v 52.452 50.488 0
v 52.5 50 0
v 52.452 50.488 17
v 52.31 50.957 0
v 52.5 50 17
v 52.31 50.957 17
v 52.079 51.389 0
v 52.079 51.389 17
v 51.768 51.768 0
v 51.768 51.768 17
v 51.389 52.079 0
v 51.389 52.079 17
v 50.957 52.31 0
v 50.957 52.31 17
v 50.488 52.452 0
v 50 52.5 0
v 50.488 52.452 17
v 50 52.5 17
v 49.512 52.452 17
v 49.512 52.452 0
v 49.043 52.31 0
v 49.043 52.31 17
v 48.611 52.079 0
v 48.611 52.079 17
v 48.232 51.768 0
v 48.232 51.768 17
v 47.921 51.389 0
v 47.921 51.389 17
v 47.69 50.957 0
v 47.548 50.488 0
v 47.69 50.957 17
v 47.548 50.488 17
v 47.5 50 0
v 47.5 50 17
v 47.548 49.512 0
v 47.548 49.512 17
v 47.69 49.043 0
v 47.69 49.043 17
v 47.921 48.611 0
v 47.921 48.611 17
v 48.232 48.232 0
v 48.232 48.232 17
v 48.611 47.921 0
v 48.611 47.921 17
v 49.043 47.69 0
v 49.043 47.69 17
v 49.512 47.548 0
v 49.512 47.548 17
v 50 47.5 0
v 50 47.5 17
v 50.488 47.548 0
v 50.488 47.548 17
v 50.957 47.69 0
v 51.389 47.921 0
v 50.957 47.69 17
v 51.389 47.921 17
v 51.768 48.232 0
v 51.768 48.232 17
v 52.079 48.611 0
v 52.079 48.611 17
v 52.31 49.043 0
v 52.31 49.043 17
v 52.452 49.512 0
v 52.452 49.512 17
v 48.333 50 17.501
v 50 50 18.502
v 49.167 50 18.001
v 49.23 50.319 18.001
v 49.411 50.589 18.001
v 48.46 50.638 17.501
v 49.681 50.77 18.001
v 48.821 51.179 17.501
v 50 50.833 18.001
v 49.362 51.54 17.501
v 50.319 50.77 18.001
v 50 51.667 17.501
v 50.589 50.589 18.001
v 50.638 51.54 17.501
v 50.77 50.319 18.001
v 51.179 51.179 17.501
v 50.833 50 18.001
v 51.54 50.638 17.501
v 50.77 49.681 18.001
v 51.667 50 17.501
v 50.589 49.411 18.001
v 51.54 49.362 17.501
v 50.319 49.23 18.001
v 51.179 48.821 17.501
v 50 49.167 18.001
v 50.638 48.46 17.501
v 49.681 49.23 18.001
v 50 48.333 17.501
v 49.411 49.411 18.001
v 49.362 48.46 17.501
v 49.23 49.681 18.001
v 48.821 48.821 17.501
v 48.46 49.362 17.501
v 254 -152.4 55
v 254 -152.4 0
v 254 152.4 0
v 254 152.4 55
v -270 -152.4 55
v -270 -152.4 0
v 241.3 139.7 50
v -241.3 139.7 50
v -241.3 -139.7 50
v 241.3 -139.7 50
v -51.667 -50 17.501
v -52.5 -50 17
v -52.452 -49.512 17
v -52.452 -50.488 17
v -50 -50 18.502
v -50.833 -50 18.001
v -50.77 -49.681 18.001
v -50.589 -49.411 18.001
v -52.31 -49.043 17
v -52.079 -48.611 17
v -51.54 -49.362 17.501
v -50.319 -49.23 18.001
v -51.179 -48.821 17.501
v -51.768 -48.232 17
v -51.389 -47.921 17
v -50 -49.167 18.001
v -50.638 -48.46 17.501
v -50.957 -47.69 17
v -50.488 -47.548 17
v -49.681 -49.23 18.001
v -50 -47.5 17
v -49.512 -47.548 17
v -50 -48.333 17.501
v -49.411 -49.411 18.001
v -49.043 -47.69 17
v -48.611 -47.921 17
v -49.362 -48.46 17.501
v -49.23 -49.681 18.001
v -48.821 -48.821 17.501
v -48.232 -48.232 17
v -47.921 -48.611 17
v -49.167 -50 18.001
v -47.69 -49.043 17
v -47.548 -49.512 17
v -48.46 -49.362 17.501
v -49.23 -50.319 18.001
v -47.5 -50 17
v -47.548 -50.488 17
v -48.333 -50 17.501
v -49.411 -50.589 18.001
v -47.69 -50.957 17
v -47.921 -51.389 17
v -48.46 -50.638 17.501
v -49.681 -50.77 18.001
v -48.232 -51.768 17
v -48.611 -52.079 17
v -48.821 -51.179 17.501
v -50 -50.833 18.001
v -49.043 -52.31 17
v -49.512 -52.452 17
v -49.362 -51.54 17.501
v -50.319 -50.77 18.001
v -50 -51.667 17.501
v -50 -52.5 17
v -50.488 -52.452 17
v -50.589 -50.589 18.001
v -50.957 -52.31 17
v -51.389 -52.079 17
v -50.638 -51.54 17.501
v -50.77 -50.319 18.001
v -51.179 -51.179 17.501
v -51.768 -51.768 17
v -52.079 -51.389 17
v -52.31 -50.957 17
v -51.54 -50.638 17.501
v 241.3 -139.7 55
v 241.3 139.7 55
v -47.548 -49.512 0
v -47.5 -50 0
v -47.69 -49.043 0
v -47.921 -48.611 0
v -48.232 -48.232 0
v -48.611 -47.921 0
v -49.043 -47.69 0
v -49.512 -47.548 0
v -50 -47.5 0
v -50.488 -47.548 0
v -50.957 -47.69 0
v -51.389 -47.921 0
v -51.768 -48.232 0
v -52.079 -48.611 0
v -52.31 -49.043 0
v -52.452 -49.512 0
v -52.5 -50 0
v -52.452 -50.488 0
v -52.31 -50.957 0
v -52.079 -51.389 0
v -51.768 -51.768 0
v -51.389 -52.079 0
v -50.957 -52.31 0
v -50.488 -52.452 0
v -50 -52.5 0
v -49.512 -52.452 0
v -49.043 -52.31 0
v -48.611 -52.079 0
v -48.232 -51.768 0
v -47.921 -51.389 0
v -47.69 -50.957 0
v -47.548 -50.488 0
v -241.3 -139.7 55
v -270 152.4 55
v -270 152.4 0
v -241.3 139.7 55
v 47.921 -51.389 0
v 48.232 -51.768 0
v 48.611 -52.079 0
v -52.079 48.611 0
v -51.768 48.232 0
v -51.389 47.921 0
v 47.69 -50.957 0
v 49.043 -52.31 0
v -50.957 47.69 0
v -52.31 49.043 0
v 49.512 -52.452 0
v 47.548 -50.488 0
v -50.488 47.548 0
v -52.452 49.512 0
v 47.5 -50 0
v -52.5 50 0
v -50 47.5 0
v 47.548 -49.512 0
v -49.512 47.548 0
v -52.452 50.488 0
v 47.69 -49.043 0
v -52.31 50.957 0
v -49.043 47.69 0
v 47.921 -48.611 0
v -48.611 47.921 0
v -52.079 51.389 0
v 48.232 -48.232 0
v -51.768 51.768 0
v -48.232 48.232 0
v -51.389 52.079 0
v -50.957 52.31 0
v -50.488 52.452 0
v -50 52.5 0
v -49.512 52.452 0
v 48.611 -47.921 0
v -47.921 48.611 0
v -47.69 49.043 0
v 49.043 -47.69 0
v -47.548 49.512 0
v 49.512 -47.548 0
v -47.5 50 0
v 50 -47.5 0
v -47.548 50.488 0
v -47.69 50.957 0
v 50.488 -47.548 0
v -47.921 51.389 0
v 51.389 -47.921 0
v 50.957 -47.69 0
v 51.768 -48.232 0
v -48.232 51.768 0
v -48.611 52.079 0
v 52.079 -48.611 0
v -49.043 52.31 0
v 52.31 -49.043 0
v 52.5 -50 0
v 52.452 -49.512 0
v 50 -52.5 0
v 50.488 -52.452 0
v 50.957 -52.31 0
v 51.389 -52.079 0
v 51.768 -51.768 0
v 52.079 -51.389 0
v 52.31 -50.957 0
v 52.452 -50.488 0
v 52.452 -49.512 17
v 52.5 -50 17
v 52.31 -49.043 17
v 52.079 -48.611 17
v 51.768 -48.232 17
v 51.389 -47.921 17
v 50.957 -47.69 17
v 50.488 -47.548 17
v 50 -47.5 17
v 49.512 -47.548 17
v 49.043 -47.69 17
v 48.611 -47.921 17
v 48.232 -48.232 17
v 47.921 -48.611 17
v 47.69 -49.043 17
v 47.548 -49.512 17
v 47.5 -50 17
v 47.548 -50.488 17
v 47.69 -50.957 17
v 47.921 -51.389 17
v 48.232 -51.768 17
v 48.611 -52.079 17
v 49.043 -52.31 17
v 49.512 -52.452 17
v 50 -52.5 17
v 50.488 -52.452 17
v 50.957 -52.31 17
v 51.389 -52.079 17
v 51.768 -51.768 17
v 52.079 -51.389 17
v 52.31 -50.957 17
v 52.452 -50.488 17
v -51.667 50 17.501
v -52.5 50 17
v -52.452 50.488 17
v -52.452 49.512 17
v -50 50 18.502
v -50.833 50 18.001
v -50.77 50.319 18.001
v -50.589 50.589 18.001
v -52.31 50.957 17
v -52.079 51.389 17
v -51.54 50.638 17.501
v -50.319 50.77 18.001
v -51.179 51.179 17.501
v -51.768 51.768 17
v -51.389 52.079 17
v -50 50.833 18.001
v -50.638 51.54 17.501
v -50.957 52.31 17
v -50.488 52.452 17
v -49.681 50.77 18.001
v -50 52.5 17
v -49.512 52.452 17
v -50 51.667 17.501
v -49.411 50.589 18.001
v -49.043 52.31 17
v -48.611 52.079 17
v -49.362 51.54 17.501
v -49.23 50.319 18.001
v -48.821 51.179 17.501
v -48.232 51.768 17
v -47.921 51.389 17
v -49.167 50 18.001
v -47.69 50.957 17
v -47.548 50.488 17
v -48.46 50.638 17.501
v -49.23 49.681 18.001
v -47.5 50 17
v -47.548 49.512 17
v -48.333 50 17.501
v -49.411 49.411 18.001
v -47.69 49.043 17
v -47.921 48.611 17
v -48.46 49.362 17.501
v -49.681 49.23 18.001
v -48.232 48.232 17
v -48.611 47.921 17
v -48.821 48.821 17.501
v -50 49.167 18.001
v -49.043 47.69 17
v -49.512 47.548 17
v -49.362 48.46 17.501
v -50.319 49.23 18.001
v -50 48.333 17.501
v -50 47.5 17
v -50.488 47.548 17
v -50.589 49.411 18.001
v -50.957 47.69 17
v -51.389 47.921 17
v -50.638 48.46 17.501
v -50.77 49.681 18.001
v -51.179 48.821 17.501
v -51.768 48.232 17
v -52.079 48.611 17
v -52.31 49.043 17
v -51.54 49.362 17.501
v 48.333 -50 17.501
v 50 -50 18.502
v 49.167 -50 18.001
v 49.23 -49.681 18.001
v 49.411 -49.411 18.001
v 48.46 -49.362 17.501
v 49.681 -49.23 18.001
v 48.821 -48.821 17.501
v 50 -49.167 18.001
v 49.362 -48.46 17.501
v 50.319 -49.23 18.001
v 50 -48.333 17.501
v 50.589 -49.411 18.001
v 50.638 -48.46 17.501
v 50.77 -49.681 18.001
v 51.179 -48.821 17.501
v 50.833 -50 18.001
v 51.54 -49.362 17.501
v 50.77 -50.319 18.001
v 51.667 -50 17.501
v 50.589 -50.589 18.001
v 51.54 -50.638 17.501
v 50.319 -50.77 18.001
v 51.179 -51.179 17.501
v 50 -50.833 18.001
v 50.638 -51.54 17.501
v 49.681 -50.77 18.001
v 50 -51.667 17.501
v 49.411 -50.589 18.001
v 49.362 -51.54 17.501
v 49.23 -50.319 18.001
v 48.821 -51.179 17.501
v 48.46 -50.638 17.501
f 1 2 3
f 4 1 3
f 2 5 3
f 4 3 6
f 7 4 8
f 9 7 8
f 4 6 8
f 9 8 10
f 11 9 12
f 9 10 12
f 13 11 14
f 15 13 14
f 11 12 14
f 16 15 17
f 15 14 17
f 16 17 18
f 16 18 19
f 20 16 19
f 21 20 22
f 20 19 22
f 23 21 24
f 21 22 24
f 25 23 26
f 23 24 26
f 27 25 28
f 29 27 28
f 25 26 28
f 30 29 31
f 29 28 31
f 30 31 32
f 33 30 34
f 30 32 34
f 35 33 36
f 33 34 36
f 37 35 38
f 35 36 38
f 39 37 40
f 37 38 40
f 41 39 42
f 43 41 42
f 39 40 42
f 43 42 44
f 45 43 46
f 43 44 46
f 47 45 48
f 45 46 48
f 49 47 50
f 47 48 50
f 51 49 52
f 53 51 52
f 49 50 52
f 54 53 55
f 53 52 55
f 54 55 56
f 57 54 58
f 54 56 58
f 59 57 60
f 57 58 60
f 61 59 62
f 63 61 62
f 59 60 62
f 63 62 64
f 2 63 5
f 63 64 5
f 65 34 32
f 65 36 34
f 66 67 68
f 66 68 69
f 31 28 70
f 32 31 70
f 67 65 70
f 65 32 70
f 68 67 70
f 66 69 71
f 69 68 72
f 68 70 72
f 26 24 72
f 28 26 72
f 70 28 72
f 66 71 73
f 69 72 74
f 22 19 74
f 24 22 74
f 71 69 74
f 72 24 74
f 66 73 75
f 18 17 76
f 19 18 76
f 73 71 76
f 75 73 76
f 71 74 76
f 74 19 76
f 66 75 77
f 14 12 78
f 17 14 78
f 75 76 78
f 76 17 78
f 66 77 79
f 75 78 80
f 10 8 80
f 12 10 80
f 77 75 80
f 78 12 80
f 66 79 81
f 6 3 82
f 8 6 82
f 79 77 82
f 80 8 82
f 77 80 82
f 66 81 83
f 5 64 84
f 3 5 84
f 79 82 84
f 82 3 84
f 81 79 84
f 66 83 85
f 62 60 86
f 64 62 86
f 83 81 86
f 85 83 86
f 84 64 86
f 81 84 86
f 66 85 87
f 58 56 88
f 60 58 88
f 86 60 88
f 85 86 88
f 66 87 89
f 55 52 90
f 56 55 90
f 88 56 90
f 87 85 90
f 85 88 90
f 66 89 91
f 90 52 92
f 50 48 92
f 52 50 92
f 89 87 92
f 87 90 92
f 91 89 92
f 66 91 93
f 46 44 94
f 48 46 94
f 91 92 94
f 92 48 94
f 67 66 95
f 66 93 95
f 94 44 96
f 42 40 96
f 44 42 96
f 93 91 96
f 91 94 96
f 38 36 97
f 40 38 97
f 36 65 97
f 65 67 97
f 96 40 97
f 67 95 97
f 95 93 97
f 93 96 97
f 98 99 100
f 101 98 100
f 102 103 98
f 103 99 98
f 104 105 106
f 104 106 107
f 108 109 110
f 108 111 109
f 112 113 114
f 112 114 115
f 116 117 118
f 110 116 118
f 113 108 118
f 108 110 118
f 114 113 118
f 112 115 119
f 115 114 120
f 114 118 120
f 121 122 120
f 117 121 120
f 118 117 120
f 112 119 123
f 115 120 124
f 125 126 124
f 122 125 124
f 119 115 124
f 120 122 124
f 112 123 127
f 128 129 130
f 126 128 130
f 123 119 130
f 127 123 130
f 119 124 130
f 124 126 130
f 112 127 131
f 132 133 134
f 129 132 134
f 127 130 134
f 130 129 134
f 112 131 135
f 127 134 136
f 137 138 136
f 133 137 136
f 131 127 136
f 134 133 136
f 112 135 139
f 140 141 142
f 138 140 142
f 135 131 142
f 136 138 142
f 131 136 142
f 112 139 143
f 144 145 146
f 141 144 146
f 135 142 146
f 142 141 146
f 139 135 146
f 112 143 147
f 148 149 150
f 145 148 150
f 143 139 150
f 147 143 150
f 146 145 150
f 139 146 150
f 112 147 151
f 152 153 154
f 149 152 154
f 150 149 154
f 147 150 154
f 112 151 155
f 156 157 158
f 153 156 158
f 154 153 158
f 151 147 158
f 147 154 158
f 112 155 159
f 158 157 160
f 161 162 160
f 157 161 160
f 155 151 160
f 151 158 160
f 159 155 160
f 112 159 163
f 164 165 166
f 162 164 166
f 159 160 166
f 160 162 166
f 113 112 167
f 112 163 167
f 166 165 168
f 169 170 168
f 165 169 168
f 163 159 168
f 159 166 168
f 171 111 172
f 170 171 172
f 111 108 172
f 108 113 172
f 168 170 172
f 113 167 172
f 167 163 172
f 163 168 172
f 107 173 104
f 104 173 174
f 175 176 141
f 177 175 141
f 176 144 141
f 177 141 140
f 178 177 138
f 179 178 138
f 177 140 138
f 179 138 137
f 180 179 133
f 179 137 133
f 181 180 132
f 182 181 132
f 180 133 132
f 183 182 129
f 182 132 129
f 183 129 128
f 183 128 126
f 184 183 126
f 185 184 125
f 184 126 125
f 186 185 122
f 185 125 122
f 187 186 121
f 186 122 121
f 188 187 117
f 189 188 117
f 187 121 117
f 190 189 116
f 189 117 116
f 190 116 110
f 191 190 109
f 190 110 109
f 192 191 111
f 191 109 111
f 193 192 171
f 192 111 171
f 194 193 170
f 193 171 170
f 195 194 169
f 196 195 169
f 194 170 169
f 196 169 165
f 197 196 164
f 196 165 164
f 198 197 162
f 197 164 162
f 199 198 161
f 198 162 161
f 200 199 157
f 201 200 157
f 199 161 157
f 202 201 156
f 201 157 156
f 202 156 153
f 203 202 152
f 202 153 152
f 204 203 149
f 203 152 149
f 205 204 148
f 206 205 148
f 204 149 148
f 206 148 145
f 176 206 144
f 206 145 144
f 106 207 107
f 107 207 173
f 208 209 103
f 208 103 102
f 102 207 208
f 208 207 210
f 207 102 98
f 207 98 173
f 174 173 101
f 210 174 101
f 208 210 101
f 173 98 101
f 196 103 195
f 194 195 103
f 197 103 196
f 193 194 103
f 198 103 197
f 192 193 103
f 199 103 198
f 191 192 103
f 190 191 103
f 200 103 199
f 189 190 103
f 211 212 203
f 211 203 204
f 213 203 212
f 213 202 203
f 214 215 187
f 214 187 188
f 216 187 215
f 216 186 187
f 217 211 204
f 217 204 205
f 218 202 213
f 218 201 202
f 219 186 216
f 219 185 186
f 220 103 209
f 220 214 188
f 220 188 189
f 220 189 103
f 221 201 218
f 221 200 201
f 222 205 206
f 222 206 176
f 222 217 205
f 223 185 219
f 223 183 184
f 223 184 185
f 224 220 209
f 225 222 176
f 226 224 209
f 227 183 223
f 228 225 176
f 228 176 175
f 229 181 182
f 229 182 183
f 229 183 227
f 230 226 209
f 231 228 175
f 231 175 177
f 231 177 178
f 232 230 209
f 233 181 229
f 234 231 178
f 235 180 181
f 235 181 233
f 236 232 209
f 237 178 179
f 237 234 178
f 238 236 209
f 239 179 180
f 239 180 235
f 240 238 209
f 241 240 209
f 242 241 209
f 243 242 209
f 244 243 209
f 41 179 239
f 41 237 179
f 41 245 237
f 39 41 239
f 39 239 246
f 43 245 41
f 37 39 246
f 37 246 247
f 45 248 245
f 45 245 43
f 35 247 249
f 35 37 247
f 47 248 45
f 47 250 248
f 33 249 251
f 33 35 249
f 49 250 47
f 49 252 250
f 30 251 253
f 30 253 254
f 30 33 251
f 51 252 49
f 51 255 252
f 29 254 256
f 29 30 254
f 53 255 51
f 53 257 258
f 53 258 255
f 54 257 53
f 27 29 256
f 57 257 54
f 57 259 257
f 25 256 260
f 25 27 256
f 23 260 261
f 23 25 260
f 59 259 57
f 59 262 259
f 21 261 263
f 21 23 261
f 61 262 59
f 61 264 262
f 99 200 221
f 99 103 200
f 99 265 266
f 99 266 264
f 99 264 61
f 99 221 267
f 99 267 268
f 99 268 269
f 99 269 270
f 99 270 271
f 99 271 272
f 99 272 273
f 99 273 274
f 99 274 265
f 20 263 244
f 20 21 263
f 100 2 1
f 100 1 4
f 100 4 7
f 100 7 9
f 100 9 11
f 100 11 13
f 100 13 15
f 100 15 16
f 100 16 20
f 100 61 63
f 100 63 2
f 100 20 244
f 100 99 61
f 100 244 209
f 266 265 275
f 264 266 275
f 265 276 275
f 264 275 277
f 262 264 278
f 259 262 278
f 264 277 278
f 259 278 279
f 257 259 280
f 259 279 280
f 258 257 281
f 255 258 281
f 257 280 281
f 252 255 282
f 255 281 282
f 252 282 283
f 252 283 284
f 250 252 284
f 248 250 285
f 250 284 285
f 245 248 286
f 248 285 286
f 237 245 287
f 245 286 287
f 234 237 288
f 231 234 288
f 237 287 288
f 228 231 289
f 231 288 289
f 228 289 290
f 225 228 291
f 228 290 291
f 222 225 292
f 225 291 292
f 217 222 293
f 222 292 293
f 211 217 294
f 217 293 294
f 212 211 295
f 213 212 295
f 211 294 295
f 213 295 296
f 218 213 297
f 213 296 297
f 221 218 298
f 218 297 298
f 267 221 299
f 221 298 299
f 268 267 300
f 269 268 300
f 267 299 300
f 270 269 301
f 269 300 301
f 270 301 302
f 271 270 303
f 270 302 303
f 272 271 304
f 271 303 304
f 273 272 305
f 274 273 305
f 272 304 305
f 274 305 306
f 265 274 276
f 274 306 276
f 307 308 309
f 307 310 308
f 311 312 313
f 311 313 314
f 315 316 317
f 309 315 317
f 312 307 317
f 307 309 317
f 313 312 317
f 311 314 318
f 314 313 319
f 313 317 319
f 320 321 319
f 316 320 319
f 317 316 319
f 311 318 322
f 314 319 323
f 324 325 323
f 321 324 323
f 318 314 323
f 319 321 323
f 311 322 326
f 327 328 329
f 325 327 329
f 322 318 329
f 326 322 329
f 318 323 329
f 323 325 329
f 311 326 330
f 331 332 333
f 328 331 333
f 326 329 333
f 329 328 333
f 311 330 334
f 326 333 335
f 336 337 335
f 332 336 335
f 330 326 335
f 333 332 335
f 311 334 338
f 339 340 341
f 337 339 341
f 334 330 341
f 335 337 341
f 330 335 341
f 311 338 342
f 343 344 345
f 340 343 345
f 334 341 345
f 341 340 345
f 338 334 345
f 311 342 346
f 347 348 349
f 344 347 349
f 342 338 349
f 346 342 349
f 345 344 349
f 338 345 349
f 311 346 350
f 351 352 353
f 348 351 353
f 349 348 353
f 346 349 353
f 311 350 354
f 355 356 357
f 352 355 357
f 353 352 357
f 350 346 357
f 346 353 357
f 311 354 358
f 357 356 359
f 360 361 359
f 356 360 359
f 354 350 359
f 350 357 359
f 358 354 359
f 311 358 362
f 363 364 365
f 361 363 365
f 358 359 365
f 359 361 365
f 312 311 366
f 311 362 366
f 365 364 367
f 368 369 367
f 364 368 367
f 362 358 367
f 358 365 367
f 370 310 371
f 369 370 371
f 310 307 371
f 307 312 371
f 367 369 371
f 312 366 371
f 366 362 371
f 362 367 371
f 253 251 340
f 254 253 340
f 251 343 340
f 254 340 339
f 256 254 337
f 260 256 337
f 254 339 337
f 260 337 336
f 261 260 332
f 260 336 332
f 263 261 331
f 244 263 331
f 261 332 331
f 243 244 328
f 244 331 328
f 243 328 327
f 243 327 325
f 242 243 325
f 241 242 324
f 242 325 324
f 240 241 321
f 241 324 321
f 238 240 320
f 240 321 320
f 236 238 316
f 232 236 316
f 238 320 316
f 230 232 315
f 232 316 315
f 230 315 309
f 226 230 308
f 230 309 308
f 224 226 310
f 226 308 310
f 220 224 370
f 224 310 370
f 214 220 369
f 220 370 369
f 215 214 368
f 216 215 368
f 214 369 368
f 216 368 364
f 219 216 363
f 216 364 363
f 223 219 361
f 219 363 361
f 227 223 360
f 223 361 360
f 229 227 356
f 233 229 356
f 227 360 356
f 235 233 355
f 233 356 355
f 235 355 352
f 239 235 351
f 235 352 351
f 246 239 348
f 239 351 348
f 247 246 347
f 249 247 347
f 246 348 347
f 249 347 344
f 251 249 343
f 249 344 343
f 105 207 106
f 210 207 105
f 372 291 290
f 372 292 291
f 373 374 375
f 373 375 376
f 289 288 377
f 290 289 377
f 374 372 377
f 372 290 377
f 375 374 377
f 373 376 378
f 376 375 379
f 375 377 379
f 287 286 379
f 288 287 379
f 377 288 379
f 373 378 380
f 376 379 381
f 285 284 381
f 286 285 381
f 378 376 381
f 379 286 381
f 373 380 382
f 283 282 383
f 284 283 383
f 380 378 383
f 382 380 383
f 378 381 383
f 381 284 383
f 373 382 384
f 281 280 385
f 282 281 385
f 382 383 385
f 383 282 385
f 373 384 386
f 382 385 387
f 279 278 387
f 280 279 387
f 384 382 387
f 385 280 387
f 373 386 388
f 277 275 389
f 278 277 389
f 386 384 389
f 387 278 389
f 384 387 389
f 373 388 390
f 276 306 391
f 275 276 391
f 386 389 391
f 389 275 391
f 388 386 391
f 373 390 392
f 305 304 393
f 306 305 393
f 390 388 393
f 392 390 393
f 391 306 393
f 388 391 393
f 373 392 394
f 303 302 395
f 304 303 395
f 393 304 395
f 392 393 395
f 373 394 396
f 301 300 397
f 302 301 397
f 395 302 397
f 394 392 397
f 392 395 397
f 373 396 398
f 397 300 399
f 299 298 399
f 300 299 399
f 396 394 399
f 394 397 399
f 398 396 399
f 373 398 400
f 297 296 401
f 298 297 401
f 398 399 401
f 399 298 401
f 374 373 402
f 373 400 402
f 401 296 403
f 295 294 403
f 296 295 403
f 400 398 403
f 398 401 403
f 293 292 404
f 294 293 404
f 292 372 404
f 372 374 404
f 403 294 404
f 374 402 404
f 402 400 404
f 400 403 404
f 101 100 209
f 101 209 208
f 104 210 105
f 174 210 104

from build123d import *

# Parameters (mm, degrees)
SKETCH2_W                 = 508
SKETCH2_H                 = 304.8
BOSS_EXTRUDE1_DEPTH       = 55
M6X1_0_TAPPED_HOLE1_D     = 5
M6X1_0_TAPPED_HOLE1_DEPTH = 17
M6X1_0_TAPPED_HOLE1_TIP   = 1.502151548
SKETCH6_W                 = 482.6
SKETCH6_H                 = 279.4
CUT_EXTRUDE1_DEPTH        = 5
SKETCH7_W                 = 55
SKETCH7_H                 = 304.8
BOSS_EXTRUDE2_DEPTH       = 16


with BuildPart() as part:
    # Sketch2 → Boss-Extrude1 (new body)
    with BuildSketch(Plane.XY):
        Rectangle(SKETCH2_W, SKETCH2_H)
    extrude(amount=BOSS_EXTRUDE1_DEPTH)

    # M6x1.0 Tapped Hole1
    with Locations(Plane(origin=(0, 0, 0), x_dir=(-1, 0, 0), z_dir=(0, 0, -1))):
        with Locations((50, 50), (-50, -50), (-50, 50), (50, -50)):
            Hole(M6X1_0_TAPPED_HOLE1_D / 2, depth=M6X1_0_TAPPED_HOLE1_DEPTH)
            with Locations((0, 0, -(M6X1_0_TAPPED_HOLE1_DEPTH + M6X1_0_TAPPED_HOLE1_TIP / 2))):  # 118° drill point
                Cone(0, M6X1_0_TAPPED_HOLE1_D / 2, M6X1_0_TAPPED_HOLE1_TIP, mode=Mode.SUBTRACT)

    # Sketch6 → Cut-Extrude1 (cut)
    with BuildSketch(Plane.XY.offset(55)):
        Rectangle(SKETCH6_W, SKETCH6_H)
    extrude(amount=-CUT_EXTRUDE1_DEPTH, mode=Mode.SUBTRACT)

    # Sketch7 → Boss-Extrude2 (add)
    with BuildSketch(Plane.ZY.offset(254)):
        with Locations((27.5, 0)):
            Rectangle(SKETCH7_W, SKETCH7_H)
    extrude(amount=BOSS_EXTRUDE2_DEPTH)


solid = part.part
